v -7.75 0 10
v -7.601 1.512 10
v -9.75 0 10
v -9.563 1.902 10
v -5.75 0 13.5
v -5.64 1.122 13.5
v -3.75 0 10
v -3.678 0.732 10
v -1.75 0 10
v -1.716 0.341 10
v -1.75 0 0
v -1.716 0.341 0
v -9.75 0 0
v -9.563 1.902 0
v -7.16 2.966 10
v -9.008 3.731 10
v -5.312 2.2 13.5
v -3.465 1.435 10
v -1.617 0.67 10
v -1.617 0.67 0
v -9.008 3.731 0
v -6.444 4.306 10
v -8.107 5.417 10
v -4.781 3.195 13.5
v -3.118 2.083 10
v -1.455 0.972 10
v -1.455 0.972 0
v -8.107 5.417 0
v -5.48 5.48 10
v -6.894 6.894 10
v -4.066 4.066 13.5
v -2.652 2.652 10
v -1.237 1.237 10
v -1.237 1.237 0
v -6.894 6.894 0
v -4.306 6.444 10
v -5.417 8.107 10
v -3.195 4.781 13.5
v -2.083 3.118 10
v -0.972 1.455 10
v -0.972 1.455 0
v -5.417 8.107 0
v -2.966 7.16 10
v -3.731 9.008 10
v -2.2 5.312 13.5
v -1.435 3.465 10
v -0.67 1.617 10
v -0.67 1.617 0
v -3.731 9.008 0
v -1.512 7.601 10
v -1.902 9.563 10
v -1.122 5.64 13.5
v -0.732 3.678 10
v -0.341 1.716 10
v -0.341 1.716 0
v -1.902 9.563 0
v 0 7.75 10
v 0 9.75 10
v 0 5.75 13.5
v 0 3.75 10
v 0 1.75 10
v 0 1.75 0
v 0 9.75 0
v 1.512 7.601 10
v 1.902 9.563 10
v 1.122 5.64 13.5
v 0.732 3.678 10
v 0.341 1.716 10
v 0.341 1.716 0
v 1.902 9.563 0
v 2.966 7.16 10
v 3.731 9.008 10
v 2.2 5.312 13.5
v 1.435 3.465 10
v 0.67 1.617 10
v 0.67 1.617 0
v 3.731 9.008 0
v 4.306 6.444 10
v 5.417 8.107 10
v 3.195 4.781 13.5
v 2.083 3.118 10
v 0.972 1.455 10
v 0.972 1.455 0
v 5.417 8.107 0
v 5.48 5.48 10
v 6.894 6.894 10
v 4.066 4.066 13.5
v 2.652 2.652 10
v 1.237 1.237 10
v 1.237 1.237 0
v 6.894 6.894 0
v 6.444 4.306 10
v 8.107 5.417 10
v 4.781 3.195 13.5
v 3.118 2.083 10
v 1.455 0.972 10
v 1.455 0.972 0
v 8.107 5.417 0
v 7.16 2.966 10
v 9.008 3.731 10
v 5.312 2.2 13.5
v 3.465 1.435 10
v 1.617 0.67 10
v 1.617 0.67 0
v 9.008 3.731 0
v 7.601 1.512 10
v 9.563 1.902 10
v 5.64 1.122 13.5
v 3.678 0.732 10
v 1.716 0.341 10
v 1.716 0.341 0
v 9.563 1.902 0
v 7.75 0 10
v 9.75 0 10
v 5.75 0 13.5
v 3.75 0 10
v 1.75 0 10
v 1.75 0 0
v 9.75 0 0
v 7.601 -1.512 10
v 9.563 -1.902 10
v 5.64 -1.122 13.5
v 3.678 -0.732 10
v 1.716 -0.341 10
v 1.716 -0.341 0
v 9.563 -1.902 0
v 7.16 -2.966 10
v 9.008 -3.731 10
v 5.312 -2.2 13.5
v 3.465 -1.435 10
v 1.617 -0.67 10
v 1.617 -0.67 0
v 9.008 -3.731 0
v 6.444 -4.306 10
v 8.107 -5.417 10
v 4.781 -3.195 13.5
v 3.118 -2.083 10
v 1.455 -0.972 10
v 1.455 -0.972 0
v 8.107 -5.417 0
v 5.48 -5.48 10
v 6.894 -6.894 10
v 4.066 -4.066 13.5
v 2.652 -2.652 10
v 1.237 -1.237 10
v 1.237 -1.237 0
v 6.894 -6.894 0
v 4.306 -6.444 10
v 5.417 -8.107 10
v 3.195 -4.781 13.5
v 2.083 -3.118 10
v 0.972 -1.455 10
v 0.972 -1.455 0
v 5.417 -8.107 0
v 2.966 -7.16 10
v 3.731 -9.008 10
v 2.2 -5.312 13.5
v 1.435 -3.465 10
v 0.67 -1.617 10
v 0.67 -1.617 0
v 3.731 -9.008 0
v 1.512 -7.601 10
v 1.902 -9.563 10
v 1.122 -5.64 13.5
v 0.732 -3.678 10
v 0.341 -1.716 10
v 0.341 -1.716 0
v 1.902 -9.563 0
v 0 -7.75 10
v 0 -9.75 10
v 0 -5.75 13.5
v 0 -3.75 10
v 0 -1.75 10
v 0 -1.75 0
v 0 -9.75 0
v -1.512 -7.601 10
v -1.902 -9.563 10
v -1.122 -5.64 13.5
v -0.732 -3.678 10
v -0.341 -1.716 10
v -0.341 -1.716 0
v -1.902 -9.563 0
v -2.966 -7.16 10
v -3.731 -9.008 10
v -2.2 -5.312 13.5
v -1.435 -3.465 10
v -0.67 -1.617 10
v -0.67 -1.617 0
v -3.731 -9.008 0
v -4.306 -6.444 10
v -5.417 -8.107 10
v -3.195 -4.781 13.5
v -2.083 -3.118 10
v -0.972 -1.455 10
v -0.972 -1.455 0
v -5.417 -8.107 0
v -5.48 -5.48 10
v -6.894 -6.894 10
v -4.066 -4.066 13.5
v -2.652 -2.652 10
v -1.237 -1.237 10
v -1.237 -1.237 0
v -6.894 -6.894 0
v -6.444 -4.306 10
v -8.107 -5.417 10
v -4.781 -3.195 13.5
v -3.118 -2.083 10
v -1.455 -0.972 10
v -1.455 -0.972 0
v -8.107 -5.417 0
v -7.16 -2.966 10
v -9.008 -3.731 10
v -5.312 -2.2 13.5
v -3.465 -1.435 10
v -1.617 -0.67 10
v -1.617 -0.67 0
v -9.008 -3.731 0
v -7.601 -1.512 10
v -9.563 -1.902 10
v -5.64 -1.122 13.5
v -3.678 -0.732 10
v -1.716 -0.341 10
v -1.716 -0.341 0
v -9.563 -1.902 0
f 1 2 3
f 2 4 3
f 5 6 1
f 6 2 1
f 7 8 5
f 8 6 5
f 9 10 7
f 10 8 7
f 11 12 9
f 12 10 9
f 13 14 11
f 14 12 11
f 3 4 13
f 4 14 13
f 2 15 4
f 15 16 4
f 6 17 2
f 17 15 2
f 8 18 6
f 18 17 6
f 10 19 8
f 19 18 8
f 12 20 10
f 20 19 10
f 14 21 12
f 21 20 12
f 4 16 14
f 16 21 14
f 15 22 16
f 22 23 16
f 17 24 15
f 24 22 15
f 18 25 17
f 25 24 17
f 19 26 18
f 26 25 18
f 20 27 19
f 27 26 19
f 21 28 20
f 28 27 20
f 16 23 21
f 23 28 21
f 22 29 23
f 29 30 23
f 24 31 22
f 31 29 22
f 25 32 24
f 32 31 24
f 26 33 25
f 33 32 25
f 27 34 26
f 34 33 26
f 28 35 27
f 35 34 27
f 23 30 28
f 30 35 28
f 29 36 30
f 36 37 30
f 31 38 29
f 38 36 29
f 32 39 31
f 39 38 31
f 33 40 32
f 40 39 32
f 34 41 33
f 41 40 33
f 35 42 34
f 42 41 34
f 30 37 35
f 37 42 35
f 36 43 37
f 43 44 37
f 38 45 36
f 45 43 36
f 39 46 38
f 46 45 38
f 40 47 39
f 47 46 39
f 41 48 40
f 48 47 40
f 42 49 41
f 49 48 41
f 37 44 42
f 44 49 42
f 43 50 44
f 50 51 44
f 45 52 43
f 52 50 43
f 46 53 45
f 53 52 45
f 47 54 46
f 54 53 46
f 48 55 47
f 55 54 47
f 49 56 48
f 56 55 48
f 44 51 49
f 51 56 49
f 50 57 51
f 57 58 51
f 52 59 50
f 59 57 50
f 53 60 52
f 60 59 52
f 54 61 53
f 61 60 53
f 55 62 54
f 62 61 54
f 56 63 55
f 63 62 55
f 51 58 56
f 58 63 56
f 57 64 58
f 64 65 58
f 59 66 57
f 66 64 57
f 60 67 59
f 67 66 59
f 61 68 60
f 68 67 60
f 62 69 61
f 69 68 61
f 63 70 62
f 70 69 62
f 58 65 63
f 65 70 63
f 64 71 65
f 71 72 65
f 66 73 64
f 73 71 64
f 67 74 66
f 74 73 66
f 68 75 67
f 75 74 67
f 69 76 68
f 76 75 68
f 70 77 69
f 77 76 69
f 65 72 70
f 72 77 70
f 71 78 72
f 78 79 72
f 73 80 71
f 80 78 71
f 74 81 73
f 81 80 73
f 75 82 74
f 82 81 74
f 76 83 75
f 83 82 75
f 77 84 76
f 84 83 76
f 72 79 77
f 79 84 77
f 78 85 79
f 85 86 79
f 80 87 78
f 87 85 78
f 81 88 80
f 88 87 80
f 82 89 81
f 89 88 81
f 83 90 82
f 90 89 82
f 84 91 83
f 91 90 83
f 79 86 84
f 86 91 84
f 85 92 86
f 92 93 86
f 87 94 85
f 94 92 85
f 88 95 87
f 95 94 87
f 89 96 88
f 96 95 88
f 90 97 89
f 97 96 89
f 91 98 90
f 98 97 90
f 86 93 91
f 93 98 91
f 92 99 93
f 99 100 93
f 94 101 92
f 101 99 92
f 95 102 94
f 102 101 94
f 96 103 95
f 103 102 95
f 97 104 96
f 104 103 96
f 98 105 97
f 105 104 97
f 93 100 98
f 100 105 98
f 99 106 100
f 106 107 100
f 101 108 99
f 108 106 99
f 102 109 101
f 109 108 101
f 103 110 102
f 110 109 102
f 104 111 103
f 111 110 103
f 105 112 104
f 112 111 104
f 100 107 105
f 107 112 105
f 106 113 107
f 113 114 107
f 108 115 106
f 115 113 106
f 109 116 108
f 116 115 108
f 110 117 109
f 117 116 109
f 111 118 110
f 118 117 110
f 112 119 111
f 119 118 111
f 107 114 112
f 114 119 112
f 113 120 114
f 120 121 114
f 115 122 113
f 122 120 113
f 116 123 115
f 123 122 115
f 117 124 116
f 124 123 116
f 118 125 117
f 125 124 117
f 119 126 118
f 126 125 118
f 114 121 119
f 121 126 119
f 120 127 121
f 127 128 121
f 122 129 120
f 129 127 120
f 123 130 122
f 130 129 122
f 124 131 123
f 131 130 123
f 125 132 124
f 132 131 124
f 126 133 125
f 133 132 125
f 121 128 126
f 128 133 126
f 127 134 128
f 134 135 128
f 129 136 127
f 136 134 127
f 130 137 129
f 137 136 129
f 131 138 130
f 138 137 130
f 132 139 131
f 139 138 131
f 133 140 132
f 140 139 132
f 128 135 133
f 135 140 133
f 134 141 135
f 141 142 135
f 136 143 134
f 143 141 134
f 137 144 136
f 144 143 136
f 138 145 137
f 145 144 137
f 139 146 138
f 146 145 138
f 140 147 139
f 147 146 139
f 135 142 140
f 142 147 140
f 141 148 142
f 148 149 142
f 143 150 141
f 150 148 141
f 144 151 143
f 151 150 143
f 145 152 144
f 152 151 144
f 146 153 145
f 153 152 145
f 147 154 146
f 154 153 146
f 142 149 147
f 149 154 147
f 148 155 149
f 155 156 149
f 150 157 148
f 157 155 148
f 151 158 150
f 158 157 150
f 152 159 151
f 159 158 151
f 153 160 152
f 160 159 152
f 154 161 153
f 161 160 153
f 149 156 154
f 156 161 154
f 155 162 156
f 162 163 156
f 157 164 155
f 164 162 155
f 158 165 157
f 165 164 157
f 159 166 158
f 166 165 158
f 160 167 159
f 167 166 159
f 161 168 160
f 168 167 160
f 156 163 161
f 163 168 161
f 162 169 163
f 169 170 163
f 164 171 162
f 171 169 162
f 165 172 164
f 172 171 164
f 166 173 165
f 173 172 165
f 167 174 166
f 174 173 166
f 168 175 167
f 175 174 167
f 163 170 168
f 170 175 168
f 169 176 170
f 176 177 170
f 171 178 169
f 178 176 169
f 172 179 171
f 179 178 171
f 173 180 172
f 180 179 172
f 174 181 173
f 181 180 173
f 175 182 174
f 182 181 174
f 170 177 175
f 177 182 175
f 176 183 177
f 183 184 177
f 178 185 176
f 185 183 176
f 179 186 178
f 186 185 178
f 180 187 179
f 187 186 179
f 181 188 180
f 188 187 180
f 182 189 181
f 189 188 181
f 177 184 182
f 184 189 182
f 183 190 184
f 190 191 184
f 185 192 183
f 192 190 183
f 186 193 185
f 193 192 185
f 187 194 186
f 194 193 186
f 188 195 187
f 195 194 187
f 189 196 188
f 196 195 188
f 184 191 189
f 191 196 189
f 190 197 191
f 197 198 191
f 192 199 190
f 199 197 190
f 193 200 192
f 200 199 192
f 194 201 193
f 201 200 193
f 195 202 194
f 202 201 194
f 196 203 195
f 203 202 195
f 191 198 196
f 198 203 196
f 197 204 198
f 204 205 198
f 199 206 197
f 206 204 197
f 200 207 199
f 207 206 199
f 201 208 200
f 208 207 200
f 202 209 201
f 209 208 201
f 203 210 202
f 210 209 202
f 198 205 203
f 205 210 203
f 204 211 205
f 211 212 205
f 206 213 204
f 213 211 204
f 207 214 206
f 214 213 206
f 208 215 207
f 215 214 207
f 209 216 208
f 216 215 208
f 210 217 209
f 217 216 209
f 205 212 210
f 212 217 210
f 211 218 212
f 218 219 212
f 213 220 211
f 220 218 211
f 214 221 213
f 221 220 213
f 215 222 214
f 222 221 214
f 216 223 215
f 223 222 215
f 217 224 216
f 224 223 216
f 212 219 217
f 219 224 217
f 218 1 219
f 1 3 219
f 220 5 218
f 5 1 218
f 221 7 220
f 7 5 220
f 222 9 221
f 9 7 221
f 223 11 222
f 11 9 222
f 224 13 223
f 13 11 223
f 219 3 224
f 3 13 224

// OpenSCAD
$fn = 32;

// ----------------------------------------------------------------------
// Form washer: domed washer, 19.5 mm outside, 3.5 mm bore
// ----------------------------------------------------------------------

// --- parameters (mm) ---
revolve_angle = 360;      // full turn around the Z axis
profile_points = 7;       // points of the closed outline

profile = [[1.75, 0], [9.75, 0], [9.75, 10], [7.75, 10], [5.75, 13.5], [3.75, 10], [1.75, 10]];  // single closed polygon, 7 points, counter clockwise

// --- the one profile operation ---
rotate_extrude(angle = revolve_angle) polygon(points = profile);
